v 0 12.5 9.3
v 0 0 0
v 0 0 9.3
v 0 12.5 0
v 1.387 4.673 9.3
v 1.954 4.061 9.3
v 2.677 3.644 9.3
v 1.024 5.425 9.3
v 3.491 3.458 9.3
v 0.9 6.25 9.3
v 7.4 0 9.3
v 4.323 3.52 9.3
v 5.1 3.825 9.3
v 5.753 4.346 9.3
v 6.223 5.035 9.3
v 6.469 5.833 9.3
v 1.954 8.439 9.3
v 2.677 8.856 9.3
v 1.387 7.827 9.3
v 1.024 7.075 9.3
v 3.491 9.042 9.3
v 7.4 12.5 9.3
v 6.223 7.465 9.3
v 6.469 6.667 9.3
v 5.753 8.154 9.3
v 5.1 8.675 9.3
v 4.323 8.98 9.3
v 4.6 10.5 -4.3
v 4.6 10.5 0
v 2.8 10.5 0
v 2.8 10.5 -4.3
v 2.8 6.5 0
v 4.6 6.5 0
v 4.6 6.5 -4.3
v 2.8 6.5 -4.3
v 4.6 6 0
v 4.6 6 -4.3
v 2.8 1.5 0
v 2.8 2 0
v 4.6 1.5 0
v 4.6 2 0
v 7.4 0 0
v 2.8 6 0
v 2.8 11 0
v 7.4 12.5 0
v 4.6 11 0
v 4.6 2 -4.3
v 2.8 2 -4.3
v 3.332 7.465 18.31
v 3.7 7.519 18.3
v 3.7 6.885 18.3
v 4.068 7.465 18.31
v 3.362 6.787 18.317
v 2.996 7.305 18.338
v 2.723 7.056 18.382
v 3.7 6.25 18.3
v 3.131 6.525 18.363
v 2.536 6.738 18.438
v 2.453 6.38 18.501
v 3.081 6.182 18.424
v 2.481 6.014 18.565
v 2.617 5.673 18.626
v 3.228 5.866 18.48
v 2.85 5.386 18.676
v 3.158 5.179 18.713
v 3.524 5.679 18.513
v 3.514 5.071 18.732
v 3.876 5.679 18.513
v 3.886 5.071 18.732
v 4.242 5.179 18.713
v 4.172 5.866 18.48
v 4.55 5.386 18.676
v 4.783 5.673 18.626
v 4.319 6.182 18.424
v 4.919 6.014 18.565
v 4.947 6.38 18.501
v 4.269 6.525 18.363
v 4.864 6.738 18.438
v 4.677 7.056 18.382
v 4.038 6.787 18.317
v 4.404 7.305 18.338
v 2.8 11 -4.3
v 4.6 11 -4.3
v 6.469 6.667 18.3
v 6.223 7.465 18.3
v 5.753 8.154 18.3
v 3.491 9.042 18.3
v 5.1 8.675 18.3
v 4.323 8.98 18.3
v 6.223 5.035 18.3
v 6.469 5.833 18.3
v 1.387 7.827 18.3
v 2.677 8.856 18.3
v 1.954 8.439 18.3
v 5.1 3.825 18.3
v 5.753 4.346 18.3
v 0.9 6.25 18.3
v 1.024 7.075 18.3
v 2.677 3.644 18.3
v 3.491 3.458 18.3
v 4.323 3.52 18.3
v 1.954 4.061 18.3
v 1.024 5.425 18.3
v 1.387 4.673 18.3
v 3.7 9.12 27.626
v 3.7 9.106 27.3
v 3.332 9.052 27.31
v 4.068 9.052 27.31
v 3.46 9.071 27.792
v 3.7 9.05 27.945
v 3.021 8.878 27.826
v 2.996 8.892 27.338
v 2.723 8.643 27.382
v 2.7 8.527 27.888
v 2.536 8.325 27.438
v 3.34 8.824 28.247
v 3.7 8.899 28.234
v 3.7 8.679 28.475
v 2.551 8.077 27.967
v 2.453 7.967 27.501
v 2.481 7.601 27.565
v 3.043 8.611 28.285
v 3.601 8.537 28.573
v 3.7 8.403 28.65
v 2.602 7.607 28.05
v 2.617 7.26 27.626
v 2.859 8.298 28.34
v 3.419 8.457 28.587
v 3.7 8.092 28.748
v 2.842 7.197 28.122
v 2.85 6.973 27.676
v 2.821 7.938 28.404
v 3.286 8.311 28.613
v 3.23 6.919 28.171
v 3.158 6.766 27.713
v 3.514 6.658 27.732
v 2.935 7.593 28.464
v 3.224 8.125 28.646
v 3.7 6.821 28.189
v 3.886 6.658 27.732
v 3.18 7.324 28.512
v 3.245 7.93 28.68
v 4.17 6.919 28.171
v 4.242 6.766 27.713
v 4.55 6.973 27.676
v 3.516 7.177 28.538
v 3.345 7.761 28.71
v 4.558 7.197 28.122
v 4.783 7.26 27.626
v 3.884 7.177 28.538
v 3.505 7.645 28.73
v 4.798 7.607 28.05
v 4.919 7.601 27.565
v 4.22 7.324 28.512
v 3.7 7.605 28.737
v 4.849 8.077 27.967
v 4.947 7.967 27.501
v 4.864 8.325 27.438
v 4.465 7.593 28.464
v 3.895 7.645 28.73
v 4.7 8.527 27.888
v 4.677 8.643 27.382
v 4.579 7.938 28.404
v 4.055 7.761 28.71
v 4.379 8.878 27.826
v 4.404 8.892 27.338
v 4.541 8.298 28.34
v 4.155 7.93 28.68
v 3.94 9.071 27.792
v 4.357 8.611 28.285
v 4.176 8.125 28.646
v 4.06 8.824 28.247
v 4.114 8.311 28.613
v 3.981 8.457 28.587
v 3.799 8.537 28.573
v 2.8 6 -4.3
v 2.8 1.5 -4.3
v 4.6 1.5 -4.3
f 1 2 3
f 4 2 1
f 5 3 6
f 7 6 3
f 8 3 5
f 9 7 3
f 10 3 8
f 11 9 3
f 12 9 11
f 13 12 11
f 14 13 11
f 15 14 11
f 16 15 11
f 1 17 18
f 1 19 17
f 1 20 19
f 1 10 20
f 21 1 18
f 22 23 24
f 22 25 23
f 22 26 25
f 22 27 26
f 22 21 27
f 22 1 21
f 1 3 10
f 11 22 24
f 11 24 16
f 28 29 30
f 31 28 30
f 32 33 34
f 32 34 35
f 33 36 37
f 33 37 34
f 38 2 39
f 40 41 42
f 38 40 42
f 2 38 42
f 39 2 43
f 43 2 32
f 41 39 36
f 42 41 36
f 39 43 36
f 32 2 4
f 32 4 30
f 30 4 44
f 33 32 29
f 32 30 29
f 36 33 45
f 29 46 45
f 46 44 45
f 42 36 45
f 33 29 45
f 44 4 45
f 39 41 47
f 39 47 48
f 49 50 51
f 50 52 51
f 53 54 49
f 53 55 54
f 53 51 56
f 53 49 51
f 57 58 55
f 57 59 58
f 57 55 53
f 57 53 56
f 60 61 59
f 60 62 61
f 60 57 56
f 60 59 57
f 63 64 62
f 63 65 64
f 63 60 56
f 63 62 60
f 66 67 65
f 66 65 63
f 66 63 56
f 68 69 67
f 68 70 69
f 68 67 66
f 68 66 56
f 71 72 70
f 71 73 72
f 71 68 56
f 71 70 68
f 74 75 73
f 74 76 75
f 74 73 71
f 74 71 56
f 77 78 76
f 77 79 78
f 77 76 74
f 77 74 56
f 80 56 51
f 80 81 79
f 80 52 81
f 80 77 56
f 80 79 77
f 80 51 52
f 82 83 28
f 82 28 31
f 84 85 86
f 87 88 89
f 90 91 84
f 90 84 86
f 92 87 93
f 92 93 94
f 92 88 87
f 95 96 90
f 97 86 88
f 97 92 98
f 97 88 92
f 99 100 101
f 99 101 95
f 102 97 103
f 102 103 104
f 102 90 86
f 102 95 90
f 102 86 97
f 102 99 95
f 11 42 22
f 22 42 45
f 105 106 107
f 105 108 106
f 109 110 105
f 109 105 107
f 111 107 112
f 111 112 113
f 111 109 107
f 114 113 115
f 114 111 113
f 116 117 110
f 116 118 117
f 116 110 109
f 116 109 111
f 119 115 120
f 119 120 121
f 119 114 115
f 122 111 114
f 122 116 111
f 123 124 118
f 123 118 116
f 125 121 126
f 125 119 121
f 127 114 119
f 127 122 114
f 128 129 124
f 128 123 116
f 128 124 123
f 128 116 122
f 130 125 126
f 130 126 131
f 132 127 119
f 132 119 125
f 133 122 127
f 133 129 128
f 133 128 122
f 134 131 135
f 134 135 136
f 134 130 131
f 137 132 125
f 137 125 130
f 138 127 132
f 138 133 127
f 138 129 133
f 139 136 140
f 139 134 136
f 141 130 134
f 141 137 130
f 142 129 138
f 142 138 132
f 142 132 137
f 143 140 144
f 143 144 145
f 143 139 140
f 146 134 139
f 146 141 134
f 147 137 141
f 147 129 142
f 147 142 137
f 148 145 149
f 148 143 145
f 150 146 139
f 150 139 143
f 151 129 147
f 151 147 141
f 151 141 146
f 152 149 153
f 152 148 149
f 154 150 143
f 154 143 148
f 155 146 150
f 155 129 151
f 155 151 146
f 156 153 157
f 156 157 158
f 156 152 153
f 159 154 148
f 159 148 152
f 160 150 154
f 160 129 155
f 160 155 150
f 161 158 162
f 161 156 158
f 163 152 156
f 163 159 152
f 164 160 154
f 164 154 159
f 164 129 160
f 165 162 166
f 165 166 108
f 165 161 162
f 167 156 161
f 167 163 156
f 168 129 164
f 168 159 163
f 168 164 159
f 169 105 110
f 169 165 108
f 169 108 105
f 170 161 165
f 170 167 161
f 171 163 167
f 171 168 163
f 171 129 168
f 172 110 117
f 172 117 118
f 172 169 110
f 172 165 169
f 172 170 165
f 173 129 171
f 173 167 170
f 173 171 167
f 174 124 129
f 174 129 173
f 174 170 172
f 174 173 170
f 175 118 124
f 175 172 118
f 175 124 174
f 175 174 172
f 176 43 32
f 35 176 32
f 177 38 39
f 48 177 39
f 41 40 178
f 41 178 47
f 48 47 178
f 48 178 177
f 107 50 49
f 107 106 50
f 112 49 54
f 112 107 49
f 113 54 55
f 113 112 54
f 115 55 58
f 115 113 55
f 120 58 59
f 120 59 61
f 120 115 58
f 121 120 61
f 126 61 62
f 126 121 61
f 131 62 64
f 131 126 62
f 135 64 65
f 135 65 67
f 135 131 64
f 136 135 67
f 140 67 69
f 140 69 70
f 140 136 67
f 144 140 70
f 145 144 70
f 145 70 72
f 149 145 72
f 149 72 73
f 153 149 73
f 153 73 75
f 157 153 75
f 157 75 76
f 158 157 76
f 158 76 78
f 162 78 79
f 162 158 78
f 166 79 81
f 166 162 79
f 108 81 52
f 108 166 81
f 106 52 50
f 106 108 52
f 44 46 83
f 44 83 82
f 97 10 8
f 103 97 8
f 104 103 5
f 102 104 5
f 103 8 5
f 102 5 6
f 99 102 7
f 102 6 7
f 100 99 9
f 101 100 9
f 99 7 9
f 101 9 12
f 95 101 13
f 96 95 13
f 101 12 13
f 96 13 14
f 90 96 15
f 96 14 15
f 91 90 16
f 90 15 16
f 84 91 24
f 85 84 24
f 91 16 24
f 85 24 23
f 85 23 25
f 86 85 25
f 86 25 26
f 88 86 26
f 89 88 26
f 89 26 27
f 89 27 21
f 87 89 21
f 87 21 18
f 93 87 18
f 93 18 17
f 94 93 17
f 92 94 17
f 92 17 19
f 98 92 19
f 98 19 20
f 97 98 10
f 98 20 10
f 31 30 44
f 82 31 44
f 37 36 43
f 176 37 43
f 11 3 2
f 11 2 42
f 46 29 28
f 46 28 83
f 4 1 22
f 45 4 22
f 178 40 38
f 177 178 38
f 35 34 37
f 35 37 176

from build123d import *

# Parameters (mm, degrees)
ESQUISSE1_W        = 7.4
ESQUISSE1_H        = 12.5
BOSS_EXTRU_1_DEPTH = 9.3
ESQUISSE2_W        = 1.8
ESQUISSE2_H        = 0.5
BOSS_EXTRU_2_DEPTH = 4.3
ESQUISSE3_R        = 2.8
BOSS_EXTRU_3_DEPTH = 9


with BuildPart() as part:
    # Esquisse1 → Boss.-Extru.1 (new body)
    with BuildSketch(Plane.XY):
        with Locations((3.7, 6.25)):
            Rectangle(ESQUISSE1_W, ESQUISSE1_H)
    extrude(amount=BOSS_EXTRU_1_DEPTH)

    # Esquisse2 → Boss.-Extru.2 (add)
    with BuildSketch(Plane(origin=(0, 0, 0), x_dir=(-1, 0, 0), z_dir=(0, 0, -1))):
        with Locations((-3.7, 1.75)):
            Rectangle(ESQUISSE2_W, ESQUISSE2_H)
        with Locations((-3.7, 6.25)):
            Rectangle(ESQUISSE2_W, ESQUISSE2_H)
        with Locations((-3.7, 10.75)):
            Rectangle(ESQUISSE2_W, ESQUISSE2_H)
    extrude(amount=BOSS_EXTRU_2_DEPTH)

    # Esquisse3 → Boss.-Extru.3 (add)
    with BuildSketch(Plane.XY.offset(9.3)):
        with Locations(Location((3.7, 6.25, 0), (0, 0, 180))):
            Circle(ESQUISSE3_R)
    extrude(amount=BOSS_EXTRU_3_DEPTH)


with BuildPart() as body_2:
    # Esquisse4 → Révolution1 (revolve)
    with BuildSketch(Plane(origin=(3.7, 0, 0), x_dir=(0, 0, -1), z_dir=(1, 0, 0))):
        with BuildLine():
            Line((-18.3, 6.25), (-18.3, 7.519283265))
            Line((-18.3, 7.519283265), (-27.3, 9.106226091))
            ThreePointArc((-27.3, 9.106226091), (-28.234030768, 8.899156455), (-28.748069913, 8.092276622))
            Line((-28.748069913, 8.092276622), (-18.3, 6.25))
        make_face()
    revolve(axis=Axis((3.7, 6.25, 18.3), (0, 0.17364817766693066, 0.984807753012208)))


solid = Compound([part.part, body_2.part])
